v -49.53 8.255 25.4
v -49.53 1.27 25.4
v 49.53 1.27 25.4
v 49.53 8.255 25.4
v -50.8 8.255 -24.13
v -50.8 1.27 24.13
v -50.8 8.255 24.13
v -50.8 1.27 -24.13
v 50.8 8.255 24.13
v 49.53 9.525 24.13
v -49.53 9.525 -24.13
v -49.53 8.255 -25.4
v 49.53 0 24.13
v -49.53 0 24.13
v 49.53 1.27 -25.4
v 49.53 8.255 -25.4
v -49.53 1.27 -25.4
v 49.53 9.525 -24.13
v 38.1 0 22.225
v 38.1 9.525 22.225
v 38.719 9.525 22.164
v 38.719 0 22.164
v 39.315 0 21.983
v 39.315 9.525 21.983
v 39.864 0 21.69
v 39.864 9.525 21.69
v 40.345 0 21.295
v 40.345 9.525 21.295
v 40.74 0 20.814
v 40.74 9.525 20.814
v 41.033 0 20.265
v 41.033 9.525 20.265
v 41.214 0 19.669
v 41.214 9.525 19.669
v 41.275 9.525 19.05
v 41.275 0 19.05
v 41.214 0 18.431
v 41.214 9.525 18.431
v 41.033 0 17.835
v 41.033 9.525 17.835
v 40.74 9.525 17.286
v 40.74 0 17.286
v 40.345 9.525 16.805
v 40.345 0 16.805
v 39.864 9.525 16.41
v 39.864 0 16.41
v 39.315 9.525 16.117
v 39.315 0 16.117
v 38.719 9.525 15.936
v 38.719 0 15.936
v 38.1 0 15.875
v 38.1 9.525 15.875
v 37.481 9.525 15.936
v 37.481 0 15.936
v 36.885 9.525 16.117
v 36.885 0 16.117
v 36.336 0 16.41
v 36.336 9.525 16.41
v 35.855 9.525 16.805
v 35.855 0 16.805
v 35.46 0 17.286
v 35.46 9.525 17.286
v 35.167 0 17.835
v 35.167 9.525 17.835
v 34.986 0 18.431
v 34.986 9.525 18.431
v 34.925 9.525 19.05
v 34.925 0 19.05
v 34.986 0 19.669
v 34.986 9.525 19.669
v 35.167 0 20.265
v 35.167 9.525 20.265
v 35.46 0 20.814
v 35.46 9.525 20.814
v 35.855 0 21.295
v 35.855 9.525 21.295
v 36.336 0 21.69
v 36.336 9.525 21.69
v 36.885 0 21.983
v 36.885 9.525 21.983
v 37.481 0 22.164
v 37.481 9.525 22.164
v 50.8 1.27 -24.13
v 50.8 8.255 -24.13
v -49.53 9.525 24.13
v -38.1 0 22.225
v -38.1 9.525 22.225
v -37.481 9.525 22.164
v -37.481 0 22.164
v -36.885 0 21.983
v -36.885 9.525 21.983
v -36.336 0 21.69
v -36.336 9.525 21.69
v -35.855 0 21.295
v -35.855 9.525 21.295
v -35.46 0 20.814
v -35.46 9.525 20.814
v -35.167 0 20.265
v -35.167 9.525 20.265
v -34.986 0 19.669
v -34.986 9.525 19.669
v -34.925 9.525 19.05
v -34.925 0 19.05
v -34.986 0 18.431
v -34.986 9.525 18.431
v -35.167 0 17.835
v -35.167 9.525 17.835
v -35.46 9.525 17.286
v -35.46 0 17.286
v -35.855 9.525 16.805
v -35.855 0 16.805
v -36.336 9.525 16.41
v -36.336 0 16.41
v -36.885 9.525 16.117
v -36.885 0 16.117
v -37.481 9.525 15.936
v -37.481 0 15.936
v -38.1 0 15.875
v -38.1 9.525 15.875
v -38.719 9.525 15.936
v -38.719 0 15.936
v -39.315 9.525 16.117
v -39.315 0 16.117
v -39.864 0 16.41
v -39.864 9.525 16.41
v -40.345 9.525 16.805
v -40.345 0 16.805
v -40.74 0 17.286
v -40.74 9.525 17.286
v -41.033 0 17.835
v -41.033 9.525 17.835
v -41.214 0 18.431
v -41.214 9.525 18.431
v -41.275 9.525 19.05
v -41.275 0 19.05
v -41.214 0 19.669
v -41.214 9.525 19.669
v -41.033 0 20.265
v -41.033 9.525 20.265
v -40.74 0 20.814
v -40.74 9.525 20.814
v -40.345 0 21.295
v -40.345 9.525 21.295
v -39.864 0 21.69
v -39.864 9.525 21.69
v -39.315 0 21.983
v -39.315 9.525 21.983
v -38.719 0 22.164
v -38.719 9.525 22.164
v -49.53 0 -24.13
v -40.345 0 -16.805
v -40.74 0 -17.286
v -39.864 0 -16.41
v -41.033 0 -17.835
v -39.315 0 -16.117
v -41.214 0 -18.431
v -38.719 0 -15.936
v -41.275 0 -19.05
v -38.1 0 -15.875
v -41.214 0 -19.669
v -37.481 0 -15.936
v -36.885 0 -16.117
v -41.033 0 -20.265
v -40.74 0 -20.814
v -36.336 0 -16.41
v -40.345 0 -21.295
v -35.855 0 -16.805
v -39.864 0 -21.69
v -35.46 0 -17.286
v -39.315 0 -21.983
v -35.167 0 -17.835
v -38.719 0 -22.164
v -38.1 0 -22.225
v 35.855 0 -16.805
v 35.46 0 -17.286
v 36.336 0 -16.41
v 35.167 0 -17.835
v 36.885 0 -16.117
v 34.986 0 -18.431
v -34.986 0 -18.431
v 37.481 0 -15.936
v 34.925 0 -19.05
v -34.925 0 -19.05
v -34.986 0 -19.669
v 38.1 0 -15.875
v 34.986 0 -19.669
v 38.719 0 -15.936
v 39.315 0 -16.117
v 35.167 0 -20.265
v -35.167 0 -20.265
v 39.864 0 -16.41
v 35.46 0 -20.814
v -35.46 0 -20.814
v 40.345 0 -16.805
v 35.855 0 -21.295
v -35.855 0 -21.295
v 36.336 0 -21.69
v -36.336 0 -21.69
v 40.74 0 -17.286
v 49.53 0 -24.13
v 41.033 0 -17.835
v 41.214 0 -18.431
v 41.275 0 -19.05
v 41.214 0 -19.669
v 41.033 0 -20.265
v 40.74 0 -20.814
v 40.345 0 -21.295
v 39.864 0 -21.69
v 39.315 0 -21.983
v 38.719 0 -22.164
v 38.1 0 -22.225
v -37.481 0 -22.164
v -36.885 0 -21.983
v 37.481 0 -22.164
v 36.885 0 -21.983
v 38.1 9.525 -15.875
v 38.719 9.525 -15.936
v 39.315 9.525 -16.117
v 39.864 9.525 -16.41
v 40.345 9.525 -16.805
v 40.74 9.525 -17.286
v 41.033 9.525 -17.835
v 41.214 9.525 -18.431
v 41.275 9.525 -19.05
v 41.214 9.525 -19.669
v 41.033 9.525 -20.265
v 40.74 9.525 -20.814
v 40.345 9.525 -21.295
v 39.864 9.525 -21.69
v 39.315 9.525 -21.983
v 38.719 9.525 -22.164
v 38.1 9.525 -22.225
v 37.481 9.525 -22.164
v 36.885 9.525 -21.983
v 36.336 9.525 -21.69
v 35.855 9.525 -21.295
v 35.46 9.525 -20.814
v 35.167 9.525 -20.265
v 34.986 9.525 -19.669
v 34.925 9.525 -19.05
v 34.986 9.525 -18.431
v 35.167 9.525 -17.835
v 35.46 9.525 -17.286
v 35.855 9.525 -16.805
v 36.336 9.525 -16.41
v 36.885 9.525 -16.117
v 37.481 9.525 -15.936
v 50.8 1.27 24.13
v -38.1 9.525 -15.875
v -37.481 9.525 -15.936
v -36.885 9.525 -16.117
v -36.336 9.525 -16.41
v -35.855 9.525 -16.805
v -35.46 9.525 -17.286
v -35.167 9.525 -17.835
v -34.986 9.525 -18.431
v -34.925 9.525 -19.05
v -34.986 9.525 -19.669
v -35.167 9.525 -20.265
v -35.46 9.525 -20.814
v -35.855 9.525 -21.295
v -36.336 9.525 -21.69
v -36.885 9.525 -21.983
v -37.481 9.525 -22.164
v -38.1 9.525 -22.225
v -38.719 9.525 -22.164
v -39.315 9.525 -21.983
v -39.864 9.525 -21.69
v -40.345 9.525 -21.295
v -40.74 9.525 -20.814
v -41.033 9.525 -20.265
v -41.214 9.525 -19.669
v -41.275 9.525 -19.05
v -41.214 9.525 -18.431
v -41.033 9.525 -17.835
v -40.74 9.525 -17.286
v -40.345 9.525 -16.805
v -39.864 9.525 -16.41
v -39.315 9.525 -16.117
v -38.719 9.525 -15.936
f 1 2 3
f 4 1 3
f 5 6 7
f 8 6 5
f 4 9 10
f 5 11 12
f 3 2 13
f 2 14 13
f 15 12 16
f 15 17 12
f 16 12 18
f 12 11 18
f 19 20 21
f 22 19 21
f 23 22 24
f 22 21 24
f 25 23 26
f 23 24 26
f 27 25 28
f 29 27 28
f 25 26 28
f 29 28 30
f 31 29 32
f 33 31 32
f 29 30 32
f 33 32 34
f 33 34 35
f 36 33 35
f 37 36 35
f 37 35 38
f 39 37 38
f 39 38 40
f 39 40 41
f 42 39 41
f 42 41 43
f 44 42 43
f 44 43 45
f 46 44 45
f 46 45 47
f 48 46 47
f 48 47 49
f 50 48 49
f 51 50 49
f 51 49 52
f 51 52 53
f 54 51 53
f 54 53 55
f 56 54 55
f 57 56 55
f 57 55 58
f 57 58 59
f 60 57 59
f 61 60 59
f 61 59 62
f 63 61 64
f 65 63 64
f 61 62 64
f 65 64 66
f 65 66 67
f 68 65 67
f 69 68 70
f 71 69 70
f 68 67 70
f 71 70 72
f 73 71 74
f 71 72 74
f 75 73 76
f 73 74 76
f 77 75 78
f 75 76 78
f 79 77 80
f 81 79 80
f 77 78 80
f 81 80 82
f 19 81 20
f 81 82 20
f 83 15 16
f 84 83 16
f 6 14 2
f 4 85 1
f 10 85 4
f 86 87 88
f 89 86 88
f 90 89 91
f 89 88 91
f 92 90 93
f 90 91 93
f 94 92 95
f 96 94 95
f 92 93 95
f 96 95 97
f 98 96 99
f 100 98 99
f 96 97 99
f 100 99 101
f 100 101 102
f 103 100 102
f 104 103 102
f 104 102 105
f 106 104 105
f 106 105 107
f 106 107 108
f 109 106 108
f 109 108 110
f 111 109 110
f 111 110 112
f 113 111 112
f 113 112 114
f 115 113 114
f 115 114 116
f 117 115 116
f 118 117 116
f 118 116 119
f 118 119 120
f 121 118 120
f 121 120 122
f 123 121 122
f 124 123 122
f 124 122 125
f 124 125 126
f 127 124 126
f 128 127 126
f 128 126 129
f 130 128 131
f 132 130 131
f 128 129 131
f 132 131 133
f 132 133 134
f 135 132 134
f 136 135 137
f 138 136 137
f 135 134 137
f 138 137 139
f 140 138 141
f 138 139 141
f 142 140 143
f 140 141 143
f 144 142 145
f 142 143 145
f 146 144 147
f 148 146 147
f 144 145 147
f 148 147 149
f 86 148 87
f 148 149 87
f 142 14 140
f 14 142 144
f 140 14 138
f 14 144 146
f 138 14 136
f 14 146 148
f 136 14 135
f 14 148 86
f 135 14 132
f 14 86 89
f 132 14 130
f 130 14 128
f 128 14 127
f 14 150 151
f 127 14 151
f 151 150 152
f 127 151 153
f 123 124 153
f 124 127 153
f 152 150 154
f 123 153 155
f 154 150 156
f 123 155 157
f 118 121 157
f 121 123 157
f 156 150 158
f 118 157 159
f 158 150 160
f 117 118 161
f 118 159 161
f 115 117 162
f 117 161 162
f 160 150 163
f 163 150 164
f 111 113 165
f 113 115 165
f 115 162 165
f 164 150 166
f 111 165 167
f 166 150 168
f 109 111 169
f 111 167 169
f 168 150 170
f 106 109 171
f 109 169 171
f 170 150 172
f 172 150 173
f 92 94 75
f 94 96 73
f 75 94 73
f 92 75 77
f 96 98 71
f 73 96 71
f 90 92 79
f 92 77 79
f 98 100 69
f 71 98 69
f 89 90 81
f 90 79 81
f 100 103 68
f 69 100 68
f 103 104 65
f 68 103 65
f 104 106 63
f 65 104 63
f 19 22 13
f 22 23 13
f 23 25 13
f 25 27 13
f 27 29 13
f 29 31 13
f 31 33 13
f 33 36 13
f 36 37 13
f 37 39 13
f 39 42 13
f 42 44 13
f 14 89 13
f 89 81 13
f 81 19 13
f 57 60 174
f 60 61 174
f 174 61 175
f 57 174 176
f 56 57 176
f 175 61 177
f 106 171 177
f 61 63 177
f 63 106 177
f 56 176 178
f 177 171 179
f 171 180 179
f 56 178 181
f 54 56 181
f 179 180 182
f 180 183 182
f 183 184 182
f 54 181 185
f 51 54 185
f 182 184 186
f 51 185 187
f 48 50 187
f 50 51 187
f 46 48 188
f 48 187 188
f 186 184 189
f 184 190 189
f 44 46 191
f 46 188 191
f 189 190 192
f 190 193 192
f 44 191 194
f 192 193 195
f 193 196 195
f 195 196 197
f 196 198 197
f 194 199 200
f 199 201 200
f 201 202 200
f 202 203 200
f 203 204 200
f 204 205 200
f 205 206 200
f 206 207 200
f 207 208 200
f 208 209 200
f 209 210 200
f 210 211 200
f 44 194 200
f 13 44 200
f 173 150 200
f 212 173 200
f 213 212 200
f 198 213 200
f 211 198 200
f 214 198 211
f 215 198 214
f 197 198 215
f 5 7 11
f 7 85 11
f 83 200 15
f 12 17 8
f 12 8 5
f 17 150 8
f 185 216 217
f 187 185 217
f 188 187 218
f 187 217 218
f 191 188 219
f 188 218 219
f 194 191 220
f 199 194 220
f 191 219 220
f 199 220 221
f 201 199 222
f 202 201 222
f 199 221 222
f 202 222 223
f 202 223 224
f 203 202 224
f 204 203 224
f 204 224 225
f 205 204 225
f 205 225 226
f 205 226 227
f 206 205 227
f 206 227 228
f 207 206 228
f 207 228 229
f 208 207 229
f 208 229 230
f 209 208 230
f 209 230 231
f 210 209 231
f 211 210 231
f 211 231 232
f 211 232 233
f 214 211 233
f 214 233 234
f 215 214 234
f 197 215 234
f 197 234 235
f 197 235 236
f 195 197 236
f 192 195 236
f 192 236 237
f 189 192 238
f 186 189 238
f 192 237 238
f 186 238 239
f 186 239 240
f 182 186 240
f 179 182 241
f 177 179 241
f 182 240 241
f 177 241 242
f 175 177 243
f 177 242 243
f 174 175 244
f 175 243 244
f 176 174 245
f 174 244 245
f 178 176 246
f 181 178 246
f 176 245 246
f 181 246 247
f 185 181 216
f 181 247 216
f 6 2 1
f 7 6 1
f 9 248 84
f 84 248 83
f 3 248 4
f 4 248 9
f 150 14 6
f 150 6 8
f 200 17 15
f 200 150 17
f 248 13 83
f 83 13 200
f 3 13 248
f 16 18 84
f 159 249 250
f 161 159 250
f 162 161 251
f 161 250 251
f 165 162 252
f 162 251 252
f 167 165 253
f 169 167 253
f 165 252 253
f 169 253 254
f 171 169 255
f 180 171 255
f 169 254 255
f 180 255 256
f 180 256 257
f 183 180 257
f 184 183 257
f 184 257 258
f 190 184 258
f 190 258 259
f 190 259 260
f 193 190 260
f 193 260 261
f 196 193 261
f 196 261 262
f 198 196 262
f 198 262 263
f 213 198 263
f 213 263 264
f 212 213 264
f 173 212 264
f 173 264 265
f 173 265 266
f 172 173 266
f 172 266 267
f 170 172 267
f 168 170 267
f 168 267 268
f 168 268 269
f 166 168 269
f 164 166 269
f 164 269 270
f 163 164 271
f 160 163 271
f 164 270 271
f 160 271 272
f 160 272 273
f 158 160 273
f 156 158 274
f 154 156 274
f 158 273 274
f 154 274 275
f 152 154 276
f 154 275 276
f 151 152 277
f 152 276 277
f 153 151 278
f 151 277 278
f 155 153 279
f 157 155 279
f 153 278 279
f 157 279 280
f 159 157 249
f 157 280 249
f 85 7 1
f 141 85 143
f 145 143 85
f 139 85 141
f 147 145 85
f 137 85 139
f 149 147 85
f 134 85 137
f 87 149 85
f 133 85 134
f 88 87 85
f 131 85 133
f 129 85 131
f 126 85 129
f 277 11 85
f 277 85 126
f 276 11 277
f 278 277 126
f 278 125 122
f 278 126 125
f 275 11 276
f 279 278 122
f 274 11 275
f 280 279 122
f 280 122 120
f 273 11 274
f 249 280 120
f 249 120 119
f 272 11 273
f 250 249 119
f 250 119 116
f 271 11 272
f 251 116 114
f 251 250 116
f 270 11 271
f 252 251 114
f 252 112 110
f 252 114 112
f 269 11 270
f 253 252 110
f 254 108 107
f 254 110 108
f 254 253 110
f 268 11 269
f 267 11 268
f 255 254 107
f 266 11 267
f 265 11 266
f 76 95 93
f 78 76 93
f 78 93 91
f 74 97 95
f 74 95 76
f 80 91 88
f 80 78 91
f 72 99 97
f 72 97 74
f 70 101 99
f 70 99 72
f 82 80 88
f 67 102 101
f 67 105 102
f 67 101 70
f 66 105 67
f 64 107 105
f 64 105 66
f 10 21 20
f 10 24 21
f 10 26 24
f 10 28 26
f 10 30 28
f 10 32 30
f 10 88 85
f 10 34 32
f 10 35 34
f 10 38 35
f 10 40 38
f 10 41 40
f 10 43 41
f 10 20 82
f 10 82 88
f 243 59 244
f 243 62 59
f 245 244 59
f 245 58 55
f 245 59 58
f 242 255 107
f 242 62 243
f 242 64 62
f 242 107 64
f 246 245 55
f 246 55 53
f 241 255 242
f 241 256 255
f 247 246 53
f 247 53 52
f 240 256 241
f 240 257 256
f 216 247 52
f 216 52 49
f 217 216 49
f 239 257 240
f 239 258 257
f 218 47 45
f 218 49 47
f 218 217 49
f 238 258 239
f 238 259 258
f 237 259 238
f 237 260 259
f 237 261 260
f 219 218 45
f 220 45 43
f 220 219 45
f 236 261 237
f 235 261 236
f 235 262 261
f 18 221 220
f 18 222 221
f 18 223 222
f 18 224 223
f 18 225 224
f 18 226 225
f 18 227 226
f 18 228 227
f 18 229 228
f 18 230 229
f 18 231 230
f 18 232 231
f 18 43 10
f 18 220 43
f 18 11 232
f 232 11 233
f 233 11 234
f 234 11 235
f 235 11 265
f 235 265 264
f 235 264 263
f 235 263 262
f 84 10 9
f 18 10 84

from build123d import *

# Parameters (mm, degrees)
SKETCH1_W           = 101.6
SKETCH1_H           = 50.8
BOSS_EXTRUDE1_DEPTH = 9.525
CHAMFER1_SIZE       = 1.27
SKETCH2_R           = 3.175
CUT_EXTRUDE1_DEPTH  = 58.589283942


with BuildPart() as part:
    # Sketch1 → Boss-Extrude1 (new body)
    with BuildSketch(Plane(origin=(0, 0, 0), x_dir=(1, 0, 0), z_dir=(0, 1, 0))):
        Rectangle(SKETCH1_W, SKETCH1_H)
    extrude(amount=BOSS_EXTRUDE1_DEPTH)

    # Chamfer1
    chamfer1_edges = [part.edges().sort_by_distance(p)[0] for p in [
        (50.8, 9.525, 0),
        (0, 9.525, -25.4),
        (-50.8, 9.525, 0),
        (0, 0, -25.4),
        (50.8, 0, 0),
        (0, 0, 25.4),
        (-50.8, 0, 0),
        (-50.8, 4.7625, -25.4),
        (50.8, 4.7625, -25.4),
        (50.8, 4.7625, 25.4),
        (-50.8, 4.7625, 25.4),
        (0, 9.525, 25.4),
    ]]
    chamfer(chamfer1_edges, length=CHAMFER1_SIZE)

    # Sketch2 → Cut-Extrude1 (cut, through all)
    with BuildSketch(Plane(origin=(0, 9.525, 0), x_dir=(1, 0, 0), z_dir=(0, 1, 0))):
        with Locations(Location((-38.1, 19.05, 0), (0, 0, 270))):
            Circle(SKETCH2_R)
        with Locations(Location((-38.1, -19.05, 0), (0, 0, 270))):
            Circle(SKETCH2_R)
        with Locations(Location((38.1, -19.05, 0), (0, 0, 270))):
            Circle(SKETCH2_R)
        with Locations(Location((38.1, 19.05, 0), (0, 0, 270))):
            Circle(SKETCH2_R)
    extrude(amount=-CUT_EXTRUDE1_DEPTH, mode=Mode.SUBTRACT)


solid = part.part
